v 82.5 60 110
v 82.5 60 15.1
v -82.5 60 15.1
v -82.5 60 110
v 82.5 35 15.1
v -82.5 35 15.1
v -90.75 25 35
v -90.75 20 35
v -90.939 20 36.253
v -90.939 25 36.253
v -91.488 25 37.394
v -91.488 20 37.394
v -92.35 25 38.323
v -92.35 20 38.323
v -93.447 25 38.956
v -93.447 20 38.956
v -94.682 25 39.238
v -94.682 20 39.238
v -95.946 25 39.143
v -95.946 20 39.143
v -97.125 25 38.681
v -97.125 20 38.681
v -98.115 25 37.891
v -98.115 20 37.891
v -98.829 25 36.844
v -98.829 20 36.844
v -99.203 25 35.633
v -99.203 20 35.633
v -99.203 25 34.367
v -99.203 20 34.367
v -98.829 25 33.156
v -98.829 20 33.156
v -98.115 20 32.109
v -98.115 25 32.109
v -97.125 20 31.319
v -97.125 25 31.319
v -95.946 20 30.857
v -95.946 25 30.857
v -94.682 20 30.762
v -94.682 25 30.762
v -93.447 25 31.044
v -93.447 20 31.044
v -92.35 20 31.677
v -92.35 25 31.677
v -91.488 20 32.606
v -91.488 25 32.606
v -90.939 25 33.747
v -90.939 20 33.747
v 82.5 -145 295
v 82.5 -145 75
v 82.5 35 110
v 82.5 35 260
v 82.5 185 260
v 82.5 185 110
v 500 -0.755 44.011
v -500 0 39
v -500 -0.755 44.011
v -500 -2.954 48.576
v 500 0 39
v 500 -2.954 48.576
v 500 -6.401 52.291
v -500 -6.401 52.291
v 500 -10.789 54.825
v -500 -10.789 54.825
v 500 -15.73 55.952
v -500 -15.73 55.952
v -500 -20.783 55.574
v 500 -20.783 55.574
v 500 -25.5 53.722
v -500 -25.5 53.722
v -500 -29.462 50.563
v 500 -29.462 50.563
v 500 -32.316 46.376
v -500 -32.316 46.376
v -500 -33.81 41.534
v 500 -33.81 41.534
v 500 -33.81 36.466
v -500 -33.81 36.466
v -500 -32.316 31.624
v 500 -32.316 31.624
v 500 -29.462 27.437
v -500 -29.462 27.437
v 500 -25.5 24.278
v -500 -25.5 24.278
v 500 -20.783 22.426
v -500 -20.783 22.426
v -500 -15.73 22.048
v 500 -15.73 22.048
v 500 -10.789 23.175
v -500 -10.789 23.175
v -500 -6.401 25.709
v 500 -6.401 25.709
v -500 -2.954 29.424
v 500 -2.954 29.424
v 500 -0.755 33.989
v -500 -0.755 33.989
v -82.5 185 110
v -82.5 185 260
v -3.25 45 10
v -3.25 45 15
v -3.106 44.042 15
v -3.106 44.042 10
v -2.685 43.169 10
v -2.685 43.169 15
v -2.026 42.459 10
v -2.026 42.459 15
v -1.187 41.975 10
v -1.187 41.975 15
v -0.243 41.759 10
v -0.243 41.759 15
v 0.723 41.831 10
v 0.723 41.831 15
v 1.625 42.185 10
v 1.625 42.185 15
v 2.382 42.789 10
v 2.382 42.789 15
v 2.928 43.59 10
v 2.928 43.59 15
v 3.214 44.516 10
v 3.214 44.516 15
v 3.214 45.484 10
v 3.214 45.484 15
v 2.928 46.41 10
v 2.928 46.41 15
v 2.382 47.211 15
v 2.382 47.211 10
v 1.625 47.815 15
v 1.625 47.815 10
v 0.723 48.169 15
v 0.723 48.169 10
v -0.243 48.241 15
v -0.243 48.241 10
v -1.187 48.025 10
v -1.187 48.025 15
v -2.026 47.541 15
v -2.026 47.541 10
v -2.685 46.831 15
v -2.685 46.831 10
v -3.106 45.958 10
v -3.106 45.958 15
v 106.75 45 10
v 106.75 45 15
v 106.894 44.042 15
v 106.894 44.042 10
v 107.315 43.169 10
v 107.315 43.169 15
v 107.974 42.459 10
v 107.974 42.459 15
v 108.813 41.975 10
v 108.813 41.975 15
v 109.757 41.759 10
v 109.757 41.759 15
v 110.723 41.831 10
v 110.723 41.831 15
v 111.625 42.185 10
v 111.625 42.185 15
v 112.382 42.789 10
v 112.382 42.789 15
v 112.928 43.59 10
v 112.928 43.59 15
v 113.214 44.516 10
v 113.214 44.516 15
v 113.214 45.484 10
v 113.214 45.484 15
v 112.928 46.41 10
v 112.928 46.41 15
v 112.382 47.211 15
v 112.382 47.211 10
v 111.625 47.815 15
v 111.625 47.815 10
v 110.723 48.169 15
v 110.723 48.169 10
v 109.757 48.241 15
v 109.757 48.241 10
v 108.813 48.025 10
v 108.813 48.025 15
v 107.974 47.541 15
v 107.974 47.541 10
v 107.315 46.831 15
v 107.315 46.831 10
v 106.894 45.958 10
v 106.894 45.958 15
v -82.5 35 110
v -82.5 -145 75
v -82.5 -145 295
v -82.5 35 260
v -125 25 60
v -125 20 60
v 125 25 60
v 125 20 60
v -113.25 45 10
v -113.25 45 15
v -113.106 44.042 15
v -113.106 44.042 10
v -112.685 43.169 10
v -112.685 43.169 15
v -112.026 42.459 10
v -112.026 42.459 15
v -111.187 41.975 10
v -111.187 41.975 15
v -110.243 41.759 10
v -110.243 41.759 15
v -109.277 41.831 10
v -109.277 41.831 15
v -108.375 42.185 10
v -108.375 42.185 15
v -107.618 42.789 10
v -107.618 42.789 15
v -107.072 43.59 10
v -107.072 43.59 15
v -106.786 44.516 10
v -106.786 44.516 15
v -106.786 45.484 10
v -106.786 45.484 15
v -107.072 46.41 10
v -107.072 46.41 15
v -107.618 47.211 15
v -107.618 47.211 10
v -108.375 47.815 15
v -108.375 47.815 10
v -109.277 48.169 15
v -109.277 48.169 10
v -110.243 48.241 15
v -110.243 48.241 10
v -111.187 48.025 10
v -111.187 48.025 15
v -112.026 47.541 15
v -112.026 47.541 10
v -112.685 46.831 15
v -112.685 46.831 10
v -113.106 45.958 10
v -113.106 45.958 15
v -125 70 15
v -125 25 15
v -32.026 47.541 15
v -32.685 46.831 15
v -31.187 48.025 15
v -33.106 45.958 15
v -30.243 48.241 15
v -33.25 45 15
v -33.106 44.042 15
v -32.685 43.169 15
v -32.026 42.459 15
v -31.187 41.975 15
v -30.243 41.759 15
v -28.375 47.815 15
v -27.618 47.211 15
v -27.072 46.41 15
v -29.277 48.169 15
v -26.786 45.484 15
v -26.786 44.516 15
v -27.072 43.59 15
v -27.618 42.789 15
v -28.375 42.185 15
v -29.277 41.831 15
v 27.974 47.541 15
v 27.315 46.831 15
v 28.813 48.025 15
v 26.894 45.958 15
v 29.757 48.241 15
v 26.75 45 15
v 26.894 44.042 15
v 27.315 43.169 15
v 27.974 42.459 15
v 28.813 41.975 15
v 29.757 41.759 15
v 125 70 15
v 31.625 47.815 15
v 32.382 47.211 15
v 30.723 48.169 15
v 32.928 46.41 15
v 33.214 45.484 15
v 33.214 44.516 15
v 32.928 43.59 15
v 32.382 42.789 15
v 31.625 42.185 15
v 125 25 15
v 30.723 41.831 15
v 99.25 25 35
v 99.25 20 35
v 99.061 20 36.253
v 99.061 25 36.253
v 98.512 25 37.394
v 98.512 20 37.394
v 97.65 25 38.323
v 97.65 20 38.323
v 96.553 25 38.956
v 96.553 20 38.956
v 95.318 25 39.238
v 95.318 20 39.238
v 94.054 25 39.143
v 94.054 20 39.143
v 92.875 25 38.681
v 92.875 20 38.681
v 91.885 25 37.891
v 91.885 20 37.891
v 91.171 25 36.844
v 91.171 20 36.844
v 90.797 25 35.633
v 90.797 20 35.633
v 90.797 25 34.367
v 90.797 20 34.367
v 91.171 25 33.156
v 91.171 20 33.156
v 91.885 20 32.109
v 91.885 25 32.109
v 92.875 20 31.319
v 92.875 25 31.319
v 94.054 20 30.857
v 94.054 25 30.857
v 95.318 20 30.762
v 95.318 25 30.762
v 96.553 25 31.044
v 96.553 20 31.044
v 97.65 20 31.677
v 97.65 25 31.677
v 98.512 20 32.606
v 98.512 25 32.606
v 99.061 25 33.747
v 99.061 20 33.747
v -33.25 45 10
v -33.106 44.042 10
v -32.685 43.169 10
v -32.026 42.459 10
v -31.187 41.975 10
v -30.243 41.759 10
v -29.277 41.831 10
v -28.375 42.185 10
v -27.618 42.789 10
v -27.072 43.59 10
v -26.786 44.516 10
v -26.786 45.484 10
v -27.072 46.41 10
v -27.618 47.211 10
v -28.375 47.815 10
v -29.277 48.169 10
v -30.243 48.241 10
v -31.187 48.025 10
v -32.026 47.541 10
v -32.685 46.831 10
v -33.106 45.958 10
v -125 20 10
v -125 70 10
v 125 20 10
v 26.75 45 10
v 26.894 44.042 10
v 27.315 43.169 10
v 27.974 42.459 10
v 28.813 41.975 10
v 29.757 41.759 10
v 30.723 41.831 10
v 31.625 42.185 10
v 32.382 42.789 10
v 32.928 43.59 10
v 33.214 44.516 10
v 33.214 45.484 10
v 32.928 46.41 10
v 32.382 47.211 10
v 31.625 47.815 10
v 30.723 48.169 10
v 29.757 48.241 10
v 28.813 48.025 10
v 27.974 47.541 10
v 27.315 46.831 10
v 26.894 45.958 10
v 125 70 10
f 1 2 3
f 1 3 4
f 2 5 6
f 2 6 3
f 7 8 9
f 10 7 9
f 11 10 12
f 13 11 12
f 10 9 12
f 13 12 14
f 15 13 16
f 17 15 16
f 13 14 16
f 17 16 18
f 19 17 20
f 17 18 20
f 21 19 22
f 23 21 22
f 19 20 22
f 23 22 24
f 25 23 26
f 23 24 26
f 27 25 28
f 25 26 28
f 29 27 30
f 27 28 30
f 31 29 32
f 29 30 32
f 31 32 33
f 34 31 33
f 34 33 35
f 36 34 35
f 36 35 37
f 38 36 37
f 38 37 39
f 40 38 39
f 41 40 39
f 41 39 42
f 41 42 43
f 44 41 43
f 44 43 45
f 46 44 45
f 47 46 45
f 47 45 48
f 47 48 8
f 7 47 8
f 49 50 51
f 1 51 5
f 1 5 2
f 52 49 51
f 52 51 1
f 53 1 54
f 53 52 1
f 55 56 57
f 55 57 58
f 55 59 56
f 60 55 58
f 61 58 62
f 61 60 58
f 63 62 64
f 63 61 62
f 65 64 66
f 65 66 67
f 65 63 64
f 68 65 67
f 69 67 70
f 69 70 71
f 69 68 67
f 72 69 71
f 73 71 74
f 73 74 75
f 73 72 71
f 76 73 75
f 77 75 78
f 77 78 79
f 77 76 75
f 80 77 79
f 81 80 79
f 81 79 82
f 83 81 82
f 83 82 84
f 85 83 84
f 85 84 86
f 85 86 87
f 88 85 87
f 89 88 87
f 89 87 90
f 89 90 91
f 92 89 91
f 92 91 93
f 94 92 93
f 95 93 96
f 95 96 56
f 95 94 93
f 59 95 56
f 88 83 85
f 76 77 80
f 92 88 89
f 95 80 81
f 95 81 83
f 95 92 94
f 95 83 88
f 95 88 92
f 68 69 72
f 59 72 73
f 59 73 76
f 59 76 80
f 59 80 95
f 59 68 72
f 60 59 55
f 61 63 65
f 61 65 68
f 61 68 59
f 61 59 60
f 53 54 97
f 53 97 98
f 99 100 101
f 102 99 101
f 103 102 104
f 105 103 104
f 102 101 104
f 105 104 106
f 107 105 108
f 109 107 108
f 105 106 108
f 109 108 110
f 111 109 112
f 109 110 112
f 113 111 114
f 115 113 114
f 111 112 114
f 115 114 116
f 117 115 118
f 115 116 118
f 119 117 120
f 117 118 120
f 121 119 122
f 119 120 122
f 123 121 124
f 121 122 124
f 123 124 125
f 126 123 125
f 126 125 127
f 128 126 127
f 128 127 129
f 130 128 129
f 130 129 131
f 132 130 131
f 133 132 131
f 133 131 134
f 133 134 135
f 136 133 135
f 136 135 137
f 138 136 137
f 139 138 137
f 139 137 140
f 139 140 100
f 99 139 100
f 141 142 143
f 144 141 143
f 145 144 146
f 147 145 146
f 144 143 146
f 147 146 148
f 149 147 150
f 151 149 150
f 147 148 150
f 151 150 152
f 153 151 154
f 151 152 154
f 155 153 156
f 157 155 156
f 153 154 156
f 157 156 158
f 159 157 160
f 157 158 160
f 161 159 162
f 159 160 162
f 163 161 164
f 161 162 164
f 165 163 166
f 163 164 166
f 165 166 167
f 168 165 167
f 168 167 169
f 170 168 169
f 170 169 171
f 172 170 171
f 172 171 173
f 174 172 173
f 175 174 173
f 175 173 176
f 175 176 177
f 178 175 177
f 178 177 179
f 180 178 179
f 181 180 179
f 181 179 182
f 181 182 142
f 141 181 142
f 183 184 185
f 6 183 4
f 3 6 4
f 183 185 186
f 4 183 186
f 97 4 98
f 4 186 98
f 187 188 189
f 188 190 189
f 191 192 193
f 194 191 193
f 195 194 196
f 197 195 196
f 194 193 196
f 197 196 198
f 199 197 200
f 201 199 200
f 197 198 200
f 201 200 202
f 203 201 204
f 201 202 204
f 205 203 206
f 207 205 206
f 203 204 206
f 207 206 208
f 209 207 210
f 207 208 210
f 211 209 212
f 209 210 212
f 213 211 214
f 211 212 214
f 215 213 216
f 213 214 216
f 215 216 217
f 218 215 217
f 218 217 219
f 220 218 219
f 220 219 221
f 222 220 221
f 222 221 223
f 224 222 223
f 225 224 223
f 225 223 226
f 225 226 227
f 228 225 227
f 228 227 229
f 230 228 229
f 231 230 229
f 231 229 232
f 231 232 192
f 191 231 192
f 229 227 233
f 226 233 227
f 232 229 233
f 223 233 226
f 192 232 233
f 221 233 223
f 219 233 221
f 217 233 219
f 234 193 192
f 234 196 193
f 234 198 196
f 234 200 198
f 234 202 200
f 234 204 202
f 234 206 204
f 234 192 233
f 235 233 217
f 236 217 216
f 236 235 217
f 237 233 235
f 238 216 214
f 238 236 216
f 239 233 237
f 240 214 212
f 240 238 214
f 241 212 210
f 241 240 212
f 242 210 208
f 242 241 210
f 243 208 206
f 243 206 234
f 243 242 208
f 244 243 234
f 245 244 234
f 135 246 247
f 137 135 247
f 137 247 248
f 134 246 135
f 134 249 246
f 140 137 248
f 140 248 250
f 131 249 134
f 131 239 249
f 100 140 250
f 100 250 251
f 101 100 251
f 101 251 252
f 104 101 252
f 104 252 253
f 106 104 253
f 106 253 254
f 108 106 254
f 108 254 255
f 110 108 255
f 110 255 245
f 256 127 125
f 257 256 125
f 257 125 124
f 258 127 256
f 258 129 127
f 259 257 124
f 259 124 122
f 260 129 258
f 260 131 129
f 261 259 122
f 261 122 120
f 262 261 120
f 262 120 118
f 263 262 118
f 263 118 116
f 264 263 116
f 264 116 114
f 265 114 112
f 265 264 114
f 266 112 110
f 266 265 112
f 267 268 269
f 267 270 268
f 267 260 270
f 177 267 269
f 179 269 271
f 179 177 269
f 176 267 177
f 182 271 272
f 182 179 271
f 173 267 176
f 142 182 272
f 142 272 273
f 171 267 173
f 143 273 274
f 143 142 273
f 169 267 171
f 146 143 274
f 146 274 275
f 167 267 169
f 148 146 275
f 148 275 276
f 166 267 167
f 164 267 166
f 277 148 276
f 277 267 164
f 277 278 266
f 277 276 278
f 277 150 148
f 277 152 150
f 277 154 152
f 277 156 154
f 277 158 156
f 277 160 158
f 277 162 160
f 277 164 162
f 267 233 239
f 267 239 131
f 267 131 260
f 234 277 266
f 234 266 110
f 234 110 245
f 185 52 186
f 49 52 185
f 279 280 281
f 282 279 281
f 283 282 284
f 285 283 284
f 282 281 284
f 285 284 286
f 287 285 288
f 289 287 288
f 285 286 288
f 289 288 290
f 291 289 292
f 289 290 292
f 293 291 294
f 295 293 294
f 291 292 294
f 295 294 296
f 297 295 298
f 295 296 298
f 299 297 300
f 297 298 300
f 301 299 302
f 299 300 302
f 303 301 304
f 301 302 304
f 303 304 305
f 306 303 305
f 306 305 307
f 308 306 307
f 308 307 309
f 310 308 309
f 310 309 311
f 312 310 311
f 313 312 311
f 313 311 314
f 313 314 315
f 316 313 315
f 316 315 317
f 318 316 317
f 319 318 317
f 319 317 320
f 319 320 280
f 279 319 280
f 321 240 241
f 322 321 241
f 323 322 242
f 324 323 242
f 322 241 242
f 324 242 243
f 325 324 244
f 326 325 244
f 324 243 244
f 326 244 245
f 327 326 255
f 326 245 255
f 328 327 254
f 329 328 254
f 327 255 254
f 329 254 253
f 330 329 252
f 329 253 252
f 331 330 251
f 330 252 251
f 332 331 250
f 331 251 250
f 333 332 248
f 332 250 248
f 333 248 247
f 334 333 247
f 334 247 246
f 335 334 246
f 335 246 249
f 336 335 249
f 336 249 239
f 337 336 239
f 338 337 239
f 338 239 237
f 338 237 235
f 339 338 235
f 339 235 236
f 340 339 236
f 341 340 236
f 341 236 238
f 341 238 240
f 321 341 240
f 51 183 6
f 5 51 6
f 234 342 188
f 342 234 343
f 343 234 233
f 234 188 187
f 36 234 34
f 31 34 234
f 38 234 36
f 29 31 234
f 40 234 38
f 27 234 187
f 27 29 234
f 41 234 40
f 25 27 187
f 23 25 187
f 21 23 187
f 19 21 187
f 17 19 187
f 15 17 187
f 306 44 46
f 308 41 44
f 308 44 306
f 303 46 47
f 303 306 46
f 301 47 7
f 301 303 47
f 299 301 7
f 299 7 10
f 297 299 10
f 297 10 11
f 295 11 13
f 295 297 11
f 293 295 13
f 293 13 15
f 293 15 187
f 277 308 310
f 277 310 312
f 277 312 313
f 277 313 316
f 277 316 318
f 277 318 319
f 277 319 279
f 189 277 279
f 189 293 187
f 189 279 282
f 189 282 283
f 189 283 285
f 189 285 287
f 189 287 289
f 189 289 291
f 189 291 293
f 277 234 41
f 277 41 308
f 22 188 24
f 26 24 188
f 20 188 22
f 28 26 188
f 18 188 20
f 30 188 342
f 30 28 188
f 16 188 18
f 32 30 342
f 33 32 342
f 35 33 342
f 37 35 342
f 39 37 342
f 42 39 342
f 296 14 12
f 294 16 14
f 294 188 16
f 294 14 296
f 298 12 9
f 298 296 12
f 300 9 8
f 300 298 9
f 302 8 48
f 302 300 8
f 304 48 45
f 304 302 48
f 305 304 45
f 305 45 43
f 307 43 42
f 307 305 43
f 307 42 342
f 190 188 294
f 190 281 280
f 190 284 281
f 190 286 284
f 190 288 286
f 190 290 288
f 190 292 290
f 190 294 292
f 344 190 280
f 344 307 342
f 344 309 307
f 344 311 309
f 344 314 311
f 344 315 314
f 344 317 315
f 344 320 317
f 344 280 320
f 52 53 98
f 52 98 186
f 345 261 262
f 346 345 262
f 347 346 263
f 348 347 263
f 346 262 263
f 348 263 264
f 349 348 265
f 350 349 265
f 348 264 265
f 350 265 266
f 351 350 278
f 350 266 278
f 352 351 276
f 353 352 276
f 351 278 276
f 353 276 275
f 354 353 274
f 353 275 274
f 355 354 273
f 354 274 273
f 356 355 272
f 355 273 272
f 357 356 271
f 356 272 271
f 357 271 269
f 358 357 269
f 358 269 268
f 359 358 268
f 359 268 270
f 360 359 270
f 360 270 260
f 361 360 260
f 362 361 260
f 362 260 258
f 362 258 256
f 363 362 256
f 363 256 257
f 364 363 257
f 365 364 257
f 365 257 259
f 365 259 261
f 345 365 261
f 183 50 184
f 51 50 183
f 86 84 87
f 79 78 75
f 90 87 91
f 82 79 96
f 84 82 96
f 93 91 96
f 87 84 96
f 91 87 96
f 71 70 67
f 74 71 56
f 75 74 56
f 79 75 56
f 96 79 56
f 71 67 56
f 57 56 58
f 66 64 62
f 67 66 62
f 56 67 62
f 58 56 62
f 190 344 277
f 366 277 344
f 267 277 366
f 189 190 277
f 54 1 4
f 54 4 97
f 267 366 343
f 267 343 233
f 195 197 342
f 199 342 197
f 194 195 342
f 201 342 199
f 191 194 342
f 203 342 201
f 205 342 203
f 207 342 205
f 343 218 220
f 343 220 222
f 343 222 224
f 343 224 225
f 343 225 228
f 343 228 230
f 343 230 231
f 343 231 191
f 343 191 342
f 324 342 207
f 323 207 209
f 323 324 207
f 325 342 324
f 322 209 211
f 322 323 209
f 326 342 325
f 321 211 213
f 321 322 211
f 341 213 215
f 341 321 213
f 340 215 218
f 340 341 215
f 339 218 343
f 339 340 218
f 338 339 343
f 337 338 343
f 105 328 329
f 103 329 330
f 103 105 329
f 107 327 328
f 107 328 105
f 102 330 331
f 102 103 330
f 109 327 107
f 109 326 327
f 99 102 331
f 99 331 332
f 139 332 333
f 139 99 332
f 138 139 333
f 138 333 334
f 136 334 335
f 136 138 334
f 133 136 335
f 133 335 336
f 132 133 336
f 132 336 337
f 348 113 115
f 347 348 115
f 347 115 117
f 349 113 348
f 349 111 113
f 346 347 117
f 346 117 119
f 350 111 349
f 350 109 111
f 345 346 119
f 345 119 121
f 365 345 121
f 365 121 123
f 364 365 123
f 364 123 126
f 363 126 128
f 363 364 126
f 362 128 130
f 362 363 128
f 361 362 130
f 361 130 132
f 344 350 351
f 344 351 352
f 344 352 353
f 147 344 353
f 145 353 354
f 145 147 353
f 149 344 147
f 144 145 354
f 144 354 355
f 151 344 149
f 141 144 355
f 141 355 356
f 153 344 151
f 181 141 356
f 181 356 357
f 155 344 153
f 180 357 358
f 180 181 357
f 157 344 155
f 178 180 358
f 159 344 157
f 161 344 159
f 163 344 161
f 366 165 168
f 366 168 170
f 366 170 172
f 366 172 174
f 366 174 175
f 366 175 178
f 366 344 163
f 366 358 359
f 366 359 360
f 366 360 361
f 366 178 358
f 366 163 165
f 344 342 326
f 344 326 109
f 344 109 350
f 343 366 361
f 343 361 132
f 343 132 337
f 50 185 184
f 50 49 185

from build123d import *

# Parameters (mm, degrees)
F1_R     = 17
F2_DEPTH = 500
F3_W     = 5
F3_H     = 45
F3_H_2   = 5
F3_W_2   = 25.8223979548
F3_W_3   = 9.1776020452
F3_W_4   = 10
F4_DEPTH = 125
F3_H_3   = 21.9
F5_DEPTH = 82.5
F7_D     = 6.5
F9_D     = 8.5
F9_DEPTH = 6
F9_TIP   = 2.5536576309


with BuildPart() as f2:
    # F1 (on Right) → F2 (new body, symmetric)
    with BuildSketch(Plane.YZ):
        with Locations((-17, 39)):
            Circle(F1_R)
    extrude(amount=F2_DEPTH, both=True)


with BuildPart() as f4:
    # F3 (on Right) → F4 (new body, symmetric)
    with BuildSketch(Plane.YZ):
        with Locations((22.5, 37.5)):
            Rectangle(F3_W, F3_H)
        with Locations((22.5, 12.5)):
            Rectangle(F3_W, F3_H_2)
        with Locations((57.0888010226, 12.5)):
            Rectangle(F3_W_2, F3_H_2)
        with Locations((29.5888010226, 12.5)):
            Rectangle(F3_W_3, F3_H_2)
        with Locations((39.1776020452, 12.5)):
            Rectangle(F3_W_4, F3_H_2)
    extrude(amount=F4_DEPTH, both=True)

    # F7 (through all)
    with Locations(Plane(origin=(0, 0, 10), x_dir=(1, 0, 0), z_dir=(0, 0, -1))):
        with Locations((110, -45), (0, -45), (-110, -45), (30, -45), (-30, -45)):
            Hole(F7_D / 2)

    # F9
    with Locations(Plane(origin=(0, 25, 0), x_dir=(-1, 0, 0), z_dir=(0, 1, 0))):
        with Locations((-95, 35), (95, 35)):
            Hole(F9_D / 2, depth=F9_DEPTH)
            with Locations((0, 0, -(F9_DEPTH + F9_TIP / 2))):  # 118° drill point
                Cone(0, F9_D / 2, F9_TIP, mode=Mode.SUBTRACT)


with BuildPart() as f5:
    # F3 (on Right) → F5 (new body, symmetric)
    with BuildSketch(Plane.YZ):
        Polygon((-145, 75), (35, 110), (35, 260), (-145, 295), align=None)
        Polygon((35, 260), (35, 110), (60, 110), (185, 110), (185, 260), align=None)
        Polygon((44.1776020452, 37), (44.1776020452, 15.1), (60, 15.1), (60, 110), (35, 110), (35, 37), align=None)
        with Locations((39.5888010226, 26.05)):
            Rectangle(F3_W_3, F3_H_3)
    extrude(amount=F5_DEPTH, both=True)


solid = Compound([f2.part, f4.part, f5.part])
